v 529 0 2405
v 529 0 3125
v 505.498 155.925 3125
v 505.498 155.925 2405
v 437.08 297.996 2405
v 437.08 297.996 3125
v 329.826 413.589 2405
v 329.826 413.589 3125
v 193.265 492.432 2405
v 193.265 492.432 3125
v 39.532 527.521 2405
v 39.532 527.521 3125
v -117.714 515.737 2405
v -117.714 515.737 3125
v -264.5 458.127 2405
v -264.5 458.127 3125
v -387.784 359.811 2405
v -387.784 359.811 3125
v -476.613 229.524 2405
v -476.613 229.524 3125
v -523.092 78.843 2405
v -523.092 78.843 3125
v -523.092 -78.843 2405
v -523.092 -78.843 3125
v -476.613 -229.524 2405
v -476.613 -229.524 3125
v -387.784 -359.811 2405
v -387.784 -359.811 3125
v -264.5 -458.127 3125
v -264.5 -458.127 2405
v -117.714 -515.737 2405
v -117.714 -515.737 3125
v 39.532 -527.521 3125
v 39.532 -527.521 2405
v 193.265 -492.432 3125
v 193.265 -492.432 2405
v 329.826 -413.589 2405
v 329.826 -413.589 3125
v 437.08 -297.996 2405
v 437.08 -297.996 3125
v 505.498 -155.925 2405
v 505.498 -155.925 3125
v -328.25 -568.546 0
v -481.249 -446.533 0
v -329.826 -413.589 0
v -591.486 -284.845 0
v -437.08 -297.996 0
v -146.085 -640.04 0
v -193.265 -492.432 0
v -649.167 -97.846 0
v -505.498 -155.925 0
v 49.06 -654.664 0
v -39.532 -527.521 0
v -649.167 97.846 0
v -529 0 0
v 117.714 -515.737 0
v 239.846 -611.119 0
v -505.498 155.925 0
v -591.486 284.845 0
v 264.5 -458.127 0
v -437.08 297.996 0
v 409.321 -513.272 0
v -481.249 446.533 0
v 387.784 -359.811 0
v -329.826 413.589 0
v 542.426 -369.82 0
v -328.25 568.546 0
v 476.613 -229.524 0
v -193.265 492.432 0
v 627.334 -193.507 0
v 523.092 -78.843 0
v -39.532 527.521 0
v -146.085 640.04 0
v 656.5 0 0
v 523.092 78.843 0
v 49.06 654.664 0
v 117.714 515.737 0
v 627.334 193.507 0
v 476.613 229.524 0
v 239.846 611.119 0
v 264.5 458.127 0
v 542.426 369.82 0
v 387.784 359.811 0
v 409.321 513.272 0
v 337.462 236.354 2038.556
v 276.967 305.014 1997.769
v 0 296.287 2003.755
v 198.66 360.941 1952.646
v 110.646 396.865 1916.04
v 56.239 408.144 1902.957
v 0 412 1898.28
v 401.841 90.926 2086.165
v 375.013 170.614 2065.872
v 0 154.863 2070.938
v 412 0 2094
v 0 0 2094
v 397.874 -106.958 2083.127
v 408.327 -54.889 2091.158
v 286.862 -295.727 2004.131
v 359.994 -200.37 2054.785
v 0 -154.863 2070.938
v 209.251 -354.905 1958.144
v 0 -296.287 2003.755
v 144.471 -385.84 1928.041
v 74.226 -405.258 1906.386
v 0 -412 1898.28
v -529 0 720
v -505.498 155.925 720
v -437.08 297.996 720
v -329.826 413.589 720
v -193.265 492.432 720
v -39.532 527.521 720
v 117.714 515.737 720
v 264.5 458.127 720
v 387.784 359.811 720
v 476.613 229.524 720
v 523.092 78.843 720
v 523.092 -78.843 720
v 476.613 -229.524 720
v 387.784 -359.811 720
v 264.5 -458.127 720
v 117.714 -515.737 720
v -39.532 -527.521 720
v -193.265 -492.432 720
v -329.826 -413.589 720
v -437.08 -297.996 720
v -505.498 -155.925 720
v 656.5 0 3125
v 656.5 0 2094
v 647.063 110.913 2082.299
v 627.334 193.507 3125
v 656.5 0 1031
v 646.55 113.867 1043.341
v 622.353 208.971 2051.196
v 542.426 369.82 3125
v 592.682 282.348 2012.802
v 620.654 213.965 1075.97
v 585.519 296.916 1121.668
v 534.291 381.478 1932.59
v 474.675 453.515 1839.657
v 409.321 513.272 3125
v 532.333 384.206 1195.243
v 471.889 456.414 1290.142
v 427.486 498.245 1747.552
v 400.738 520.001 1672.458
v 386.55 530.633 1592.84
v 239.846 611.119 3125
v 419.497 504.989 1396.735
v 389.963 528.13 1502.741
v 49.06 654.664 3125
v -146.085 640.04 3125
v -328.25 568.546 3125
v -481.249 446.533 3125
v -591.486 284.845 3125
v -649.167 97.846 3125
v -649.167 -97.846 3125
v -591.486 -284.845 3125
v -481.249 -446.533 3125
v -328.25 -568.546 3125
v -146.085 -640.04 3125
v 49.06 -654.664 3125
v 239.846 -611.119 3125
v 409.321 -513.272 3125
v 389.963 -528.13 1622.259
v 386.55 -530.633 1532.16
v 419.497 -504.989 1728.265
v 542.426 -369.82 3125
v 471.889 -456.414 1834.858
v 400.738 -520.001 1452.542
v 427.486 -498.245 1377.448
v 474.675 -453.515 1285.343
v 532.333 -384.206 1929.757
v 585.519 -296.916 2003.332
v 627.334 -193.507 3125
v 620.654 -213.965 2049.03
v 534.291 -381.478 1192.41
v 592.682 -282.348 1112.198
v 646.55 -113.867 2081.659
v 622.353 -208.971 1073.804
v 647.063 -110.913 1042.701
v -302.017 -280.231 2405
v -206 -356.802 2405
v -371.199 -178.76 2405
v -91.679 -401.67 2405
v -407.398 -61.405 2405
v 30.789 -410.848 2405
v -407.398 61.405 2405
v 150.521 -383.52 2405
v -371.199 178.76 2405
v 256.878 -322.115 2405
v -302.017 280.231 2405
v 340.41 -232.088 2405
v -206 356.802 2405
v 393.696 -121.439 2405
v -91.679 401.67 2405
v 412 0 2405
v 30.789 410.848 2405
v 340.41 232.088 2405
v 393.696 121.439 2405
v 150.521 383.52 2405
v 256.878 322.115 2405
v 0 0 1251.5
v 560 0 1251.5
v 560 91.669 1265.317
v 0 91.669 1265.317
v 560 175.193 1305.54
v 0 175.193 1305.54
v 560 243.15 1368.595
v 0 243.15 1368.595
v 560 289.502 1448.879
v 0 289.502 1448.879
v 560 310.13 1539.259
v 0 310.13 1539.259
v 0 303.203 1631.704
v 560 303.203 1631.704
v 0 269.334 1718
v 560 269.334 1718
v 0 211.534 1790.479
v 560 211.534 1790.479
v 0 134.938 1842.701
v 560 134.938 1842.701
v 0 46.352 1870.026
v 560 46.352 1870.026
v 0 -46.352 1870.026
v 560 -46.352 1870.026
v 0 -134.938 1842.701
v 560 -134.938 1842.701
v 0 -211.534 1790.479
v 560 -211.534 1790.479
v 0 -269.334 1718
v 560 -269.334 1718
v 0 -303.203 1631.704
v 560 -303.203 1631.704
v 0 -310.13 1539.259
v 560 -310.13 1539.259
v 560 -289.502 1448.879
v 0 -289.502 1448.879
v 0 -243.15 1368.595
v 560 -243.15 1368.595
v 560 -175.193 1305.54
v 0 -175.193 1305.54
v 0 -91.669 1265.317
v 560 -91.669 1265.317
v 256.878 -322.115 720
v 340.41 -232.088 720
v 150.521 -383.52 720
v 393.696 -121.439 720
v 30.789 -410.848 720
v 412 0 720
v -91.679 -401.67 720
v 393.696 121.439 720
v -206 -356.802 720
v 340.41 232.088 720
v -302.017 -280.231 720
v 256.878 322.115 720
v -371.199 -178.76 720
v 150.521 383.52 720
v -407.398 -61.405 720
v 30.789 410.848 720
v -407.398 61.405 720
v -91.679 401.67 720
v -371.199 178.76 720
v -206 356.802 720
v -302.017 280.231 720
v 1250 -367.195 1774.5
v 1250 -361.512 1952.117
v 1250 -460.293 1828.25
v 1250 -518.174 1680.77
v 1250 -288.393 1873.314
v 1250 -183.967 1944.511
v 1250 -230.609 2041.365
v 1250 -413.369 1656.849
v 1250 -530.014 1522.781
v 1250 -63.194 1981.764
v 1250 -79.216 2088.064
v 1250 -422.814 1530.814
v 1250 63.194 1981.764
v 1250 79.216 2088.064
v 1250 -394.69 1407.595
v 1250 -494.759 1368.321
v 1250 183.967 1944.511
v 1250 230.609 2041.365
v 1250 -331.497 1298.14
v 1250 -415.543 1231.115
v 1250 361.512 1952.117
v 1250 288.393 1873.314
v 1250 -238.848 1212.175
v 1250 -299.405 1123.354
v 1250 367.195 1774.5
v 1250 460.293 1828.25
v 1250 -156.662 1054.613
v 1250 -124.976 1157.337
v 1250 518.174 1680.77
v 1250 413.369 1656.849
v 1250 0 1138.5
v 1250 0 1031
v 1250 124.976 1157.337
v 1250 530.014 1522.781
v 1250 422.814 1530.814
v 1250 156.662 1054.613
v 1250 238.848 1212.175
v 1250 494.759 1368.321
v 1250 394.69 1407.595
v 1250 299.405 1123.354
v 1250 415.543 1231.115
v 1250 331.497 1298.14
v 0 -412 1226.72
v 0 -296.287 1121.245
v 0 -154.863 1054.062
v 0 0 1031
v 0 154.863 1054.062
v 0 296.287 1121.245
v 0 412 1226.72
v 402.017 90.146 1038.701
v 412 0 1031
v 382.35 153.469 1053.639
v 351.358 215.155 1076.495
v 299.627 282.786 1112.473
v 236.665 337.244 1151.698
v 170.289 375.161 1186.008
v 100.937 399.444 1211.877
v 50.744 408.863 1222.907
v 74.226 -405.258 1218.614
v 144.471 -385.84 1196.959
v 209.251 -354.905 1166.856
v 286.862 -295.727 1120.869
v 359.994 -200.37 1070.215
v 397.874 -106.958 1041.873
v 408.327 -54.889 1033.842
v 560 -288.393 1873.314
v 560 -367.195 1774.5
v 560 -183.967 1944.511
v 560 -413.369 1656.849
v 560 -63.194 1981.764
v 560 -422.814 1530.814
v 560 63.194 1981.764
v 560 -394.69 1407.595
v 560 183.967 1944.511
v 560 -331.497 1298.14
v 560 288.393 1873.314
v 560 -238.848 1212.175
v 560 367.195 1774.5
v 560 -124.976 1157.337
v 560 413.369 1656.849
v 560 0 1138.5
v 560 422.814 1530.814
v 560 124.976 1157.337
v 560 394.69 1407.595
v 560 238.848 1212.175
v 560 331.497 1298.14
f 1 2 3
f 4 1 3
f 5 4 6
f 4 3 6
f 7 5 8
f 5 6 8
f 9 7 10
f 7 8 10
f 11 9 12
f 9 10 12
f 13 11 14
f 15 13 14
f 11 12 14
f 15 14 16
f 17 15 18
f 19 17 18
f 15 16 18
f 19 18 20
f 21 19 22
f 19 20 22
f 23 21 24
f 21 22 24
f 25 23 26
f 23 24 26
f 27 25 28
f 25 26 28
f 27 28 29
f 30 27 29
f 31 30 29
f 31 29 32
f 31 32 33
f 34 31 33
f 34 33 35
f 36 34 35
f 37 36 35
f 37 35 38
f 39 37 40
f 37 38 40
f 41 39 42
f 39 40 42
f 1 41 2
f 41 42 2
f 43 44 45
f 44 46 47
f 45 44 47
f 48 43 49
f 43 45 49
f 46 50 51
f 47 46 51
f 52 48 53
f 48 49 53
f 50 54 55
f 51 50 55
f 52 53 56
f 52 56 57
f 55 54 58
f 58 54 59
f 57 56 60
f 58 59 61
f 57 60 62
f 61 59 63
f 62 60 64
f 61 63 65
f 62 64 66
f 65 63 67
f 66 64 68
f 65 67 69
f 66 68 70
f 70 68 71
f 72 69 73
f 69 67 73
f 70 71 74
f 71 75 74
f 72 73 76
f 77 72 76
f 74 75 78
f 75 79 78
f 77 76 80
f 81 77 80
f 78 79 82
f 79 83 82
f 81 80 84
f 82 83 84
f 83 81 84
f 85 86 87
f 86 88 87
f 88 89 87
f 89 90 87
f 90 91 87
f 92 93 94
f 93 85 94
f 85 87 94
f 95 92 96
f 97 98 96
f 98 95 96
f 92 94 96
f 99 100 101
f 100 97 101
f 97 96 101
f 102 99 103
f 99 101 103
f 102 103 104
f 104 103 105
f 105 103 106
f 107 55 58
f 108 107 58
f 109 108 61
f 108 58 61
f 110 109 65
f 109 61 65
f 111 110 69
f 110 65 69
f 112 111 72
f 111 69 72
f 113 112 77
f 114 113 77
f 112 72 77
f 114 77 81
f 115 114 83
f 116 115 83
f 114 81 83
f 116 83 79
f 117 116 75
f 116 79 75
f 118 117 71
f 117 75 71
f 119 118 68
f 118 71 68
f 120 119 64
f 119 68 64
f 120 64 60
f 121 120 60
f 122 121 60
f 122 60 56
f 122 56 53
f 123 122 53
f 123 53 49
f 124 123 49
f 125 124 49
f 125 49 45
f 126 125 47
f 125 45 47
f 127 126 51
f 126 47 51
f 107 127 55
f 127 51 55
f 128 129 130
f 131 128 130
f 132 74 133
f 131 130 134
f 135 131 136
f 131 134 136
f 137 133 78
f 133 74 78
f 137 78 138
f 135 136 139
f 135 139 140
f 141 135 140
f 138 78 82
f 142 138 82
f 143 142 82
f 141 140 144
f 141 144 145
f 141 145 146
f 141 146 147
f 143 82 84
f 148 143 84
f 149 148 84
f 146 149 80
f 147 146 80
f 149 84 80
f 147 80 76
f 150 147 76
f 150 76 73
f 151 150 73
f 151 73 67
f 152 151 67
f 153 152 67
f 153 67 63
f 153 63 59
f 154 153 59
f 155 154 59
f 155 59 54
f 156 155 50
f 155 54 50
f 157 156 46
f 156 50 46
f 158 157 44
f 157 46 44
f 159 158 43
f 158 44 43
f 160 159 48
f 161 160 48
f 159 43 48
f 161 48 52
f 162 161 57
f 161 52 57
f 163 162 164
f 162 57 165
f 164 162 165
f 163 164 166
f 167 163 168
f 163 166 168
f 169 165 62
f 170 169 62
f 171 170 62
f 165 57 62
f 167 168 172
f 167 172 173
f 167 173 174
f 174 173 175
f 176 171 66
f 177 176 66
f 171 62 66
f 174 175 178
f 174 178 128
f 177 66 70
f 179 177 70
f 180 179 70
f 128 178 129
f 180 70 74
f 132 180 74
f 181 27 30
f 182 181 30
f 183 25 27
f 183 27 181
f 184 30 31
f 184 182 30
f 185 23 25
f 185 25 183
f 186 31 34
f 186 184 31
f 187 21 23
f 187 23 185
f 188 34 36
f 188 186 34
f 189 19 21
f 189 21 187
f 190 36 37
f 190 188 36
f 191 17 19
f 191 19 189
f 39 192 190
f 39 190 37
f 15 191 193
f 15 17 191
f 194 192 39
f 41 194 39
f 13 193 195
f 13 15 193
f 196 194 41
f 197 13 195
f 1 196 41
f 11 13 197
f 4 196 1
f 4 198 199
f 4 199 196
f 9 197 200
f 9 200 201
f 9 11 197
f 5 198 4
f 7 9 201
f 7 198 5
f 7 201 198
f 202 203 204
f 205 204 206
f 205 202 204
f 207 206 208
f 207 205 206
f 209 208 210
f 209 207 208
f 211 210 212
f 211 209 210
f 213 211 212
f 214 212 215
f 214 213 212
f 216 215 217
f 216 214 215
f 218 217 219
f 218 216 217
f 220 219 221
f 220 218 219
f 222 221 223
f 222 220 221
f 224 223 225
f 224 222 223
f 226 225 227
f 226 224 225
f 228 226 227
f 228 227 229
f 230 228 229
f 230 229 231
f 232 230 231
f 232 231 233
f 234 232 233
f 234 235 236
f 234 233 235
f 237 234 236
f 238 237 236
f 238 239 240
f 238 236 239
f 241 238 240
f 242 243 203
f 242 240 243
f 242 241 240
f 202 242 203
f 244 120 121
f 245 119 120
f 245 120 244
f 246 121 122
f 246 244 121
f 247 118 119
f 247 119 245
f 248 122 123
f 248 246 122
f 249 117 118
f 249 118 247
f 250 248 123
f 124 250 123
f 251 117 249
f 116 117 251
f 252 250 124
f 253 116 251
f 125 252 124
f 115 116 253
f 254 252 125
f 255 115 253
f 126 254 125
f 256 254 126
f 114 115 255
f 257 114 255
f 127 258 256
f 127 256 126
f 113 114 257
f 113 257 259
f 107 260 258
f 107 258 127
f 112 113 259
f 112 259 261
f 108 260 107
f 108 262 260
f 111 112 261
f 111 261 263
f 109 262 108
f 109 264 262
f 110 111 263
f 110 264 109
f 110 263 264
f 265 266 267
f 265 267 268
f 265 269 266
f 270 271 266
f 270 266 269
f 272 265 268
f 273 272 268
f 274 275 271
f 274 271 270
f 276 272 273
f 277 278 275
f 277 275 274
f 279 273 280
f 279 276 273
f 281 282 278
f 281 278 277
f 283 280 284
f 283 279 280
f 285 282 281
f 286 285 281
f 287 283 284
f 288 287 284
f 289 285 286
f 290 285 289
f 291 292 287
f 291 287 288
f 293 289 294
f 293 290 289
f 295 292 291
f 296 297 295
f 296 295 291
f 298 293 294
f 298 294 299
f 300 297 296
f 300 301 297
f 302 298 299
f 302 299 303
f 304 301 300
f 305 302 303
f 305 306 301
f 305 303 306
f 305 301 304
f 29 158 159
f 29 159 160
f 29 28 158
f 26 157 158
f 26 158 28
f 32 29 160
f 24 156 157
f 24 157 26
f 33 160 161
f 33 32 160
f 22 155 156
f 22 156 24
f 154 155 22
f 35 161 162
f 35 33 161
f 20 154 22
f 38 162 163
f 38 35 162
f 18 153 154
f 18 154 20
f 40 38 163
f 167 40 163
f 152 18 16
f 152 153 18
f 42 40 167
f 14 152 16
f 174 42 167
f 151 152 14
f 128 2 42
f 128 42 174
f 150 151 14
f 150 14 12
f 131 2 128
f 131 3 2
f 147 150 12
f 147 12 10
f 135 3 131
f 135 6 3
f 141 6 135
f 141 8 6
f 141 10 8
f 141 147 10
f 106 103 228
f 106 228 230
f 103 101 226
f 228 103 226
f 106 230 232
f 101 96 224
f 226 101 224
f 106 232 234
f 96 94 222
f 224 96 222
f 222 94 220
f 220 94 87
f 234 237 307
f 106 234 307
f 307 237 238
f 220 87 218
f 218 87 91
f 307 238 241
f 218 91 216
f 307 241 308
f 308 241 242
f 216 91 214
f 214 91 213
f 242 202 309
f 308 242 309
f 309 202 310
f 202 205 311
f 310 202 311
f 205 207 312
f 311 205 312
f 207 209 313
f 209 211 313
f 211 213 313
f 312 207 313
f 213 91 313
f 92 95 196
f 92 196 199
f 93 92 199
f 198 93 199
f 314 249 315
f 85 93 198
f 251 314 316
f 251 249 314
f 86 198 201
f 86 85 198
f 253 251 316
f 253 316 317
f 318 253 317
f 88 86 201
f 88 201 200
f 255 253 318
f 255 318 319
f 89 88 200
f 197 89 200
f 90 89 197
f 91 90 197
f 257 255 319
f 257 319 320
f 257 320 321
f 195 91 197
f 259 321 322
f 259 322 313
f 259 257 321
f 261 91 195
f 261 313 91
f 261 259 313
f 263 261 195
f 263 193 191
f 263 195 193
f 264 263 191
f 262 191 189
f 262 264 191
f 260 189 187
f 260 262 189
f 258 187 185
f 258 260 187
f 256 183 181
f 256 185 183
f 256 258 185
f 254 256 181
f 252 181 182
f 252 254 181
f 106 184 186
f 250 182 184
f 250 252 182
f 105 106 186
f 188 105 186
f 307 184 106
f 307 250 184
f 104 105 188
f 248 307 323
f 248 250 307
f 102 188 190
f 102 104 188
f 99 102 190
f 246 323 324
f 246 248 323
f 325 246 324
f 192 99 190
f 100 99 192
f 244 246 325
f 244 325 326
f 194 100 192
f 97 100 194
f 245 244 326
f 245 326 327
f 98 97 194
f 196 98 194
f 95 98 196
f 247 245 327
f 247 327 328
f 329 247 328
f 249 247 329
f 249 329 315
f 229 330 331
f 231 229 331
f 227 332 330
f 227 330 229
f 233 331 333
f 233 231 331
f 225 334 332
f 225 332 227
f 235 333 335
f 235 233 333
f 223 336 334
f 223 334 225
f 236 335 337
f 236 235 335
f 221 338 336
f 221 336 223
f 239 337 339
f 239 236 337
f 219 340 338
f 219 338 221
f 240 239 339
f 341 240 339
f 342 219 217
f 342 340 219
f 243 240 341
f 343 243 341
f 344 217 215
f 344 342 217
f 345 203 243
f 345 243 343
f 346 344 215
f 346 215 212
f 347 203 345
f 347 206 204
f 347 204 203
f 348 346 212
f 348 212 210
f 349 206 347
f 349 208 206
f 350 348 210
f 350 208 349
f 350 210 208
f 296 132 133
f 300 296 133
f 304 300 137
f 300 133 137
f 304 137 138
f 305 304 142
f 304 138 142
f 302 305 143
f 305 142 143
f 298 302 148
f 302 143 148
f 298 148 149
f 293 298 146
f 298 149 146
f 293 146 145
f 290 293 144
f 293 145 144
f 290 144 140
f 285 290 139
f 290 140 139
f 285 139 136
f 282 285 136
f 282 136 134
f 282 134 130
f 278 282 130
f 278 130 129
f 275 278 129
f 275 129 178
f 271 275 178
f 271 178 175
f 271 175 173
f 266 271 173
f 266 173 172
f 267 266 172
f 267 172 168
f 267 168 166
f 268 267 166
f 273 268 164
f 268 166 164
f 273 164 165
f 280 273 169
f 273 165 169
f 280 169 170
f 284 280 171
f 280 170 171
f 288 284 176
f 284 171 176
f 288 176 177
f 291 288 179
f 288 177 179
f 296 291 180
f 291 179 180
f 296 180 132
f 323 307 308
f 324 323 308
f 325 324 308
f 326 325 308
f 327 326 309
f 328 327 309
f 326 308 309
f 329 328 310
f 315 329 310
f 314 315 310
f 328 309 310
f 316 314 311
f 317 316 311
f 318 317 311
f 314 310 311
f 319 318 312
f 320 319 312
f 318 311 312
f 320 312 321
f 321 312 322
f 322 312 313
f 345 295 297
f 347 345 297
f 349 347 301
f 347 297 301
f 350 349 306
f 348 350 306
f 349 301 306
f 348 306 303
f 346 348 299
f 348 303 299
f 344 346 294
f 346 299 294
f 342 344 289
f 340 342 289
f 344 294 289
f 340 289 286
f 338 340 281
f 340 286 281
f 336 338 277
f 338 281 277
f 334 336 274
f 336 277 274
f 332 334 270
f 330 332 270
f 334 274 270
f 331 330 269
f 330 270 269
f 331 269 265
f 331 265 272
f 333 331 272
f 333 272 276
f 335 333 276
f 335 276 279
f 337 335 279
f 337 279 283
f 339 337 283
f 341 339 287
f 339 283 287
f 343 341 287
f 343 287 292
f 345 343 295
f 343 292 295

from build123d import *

# Parameters (mm, degrees)
SKETCH1_R           = 656.5
SKETCH1_R_2         = 412
BOSS_EXTRUDE1_DEPTH = 3125
SKETCH2_R           = 529
CUT_EXTRUDE1_DEPTH  = 720
SKETCH3_R           = 529
CUT_EXTRUDE2_DEPTH  = 720
SKETCH7_R           = 531.5
SKETCH7_R_2         = 311
BOSS_EXTRUDE3_DEPTH = 1250
SKETCH8_R           = 311
CUT_EXTRUDE7_DEPTH  = 1250
SKETCH10_R          = 424
CUT_EXTRUDE8_DEPTH  = 690


with BuildPart() as part:
    # Sketch1 → Boss-Extrude1 (new body)
    with BuildSketch(Plane.XY):
        Circle(SKETCH1_R)
        Circle(SKETCH1_R_2, mode=Mode.SUBTRACT)
    extrude(amount=BOSS_EXTRUDE1_DEPTH)

    # Sketch2 → Cut-Extrude1 (cut)
    with BuildSketch(Plane.XY.offset(3125)):
        Circle(SKETCH2_R)
    extrude(amount=-CUT_EXTRUDE1_DEPTH, mode=Mode.SUBTRACT)

    # Sketch3 → Cut-Extrude2 (cut)
    with BuildSketch(Plane(origin=(0, 0, 0), x_dir=(-1, 0, 0), z_dir=(0, 0, -1))):
        Circle(SKETCH3_R)
    extrude(amount=-CUT_EXTRUDE2_DEPTH, mode=Mode.SUBTRACT)

    # Sketch7 → Boss-Extrude3 (add)
    with BuildSketch(Plane(origin=(0, 0, 0), x_dir=(0, 0, -1), z_dir=(1, 0, 0))):
        with Locations((-1562.5, 0)):
            Circle(SKETCH7_R)
        with Locations((-1562.5, 0)):
            Circle(SKETCH7_R_2, mode=Mode.SUBTRACT)
    extrude(amount=BOSS_EXTRUDE3_DEPTH)

    # Sketch8 → Cut-Extrude7 (cut)
    with BuildSketch(Plane(origin=(0, 0, 0), x_dir=(0, 0, -1), z_dir=(1, 0, 0))):
        with Locations((-1562.5, 0)):
            Circle(SKETCH8_R)
    extrude(amount=CUT_EXTRUDE7_DEPTH, mode=Mode.SUBTRACT)

    # Sketch10 → Cut-Extrude8 (cut)
    with BuildSketch(Plane(origin=(1250, 0, 0), x_dir=(0, 0, -1), z_dir=(1, 0, 0))):
        with Locations((-1562.5, 0)):
            Circle(SKETCH10_R)
    extrude(amount=-CUT_EXTRUDE8_DEPTH, mode=Mode.SUBTRACT)


solid = part.part
